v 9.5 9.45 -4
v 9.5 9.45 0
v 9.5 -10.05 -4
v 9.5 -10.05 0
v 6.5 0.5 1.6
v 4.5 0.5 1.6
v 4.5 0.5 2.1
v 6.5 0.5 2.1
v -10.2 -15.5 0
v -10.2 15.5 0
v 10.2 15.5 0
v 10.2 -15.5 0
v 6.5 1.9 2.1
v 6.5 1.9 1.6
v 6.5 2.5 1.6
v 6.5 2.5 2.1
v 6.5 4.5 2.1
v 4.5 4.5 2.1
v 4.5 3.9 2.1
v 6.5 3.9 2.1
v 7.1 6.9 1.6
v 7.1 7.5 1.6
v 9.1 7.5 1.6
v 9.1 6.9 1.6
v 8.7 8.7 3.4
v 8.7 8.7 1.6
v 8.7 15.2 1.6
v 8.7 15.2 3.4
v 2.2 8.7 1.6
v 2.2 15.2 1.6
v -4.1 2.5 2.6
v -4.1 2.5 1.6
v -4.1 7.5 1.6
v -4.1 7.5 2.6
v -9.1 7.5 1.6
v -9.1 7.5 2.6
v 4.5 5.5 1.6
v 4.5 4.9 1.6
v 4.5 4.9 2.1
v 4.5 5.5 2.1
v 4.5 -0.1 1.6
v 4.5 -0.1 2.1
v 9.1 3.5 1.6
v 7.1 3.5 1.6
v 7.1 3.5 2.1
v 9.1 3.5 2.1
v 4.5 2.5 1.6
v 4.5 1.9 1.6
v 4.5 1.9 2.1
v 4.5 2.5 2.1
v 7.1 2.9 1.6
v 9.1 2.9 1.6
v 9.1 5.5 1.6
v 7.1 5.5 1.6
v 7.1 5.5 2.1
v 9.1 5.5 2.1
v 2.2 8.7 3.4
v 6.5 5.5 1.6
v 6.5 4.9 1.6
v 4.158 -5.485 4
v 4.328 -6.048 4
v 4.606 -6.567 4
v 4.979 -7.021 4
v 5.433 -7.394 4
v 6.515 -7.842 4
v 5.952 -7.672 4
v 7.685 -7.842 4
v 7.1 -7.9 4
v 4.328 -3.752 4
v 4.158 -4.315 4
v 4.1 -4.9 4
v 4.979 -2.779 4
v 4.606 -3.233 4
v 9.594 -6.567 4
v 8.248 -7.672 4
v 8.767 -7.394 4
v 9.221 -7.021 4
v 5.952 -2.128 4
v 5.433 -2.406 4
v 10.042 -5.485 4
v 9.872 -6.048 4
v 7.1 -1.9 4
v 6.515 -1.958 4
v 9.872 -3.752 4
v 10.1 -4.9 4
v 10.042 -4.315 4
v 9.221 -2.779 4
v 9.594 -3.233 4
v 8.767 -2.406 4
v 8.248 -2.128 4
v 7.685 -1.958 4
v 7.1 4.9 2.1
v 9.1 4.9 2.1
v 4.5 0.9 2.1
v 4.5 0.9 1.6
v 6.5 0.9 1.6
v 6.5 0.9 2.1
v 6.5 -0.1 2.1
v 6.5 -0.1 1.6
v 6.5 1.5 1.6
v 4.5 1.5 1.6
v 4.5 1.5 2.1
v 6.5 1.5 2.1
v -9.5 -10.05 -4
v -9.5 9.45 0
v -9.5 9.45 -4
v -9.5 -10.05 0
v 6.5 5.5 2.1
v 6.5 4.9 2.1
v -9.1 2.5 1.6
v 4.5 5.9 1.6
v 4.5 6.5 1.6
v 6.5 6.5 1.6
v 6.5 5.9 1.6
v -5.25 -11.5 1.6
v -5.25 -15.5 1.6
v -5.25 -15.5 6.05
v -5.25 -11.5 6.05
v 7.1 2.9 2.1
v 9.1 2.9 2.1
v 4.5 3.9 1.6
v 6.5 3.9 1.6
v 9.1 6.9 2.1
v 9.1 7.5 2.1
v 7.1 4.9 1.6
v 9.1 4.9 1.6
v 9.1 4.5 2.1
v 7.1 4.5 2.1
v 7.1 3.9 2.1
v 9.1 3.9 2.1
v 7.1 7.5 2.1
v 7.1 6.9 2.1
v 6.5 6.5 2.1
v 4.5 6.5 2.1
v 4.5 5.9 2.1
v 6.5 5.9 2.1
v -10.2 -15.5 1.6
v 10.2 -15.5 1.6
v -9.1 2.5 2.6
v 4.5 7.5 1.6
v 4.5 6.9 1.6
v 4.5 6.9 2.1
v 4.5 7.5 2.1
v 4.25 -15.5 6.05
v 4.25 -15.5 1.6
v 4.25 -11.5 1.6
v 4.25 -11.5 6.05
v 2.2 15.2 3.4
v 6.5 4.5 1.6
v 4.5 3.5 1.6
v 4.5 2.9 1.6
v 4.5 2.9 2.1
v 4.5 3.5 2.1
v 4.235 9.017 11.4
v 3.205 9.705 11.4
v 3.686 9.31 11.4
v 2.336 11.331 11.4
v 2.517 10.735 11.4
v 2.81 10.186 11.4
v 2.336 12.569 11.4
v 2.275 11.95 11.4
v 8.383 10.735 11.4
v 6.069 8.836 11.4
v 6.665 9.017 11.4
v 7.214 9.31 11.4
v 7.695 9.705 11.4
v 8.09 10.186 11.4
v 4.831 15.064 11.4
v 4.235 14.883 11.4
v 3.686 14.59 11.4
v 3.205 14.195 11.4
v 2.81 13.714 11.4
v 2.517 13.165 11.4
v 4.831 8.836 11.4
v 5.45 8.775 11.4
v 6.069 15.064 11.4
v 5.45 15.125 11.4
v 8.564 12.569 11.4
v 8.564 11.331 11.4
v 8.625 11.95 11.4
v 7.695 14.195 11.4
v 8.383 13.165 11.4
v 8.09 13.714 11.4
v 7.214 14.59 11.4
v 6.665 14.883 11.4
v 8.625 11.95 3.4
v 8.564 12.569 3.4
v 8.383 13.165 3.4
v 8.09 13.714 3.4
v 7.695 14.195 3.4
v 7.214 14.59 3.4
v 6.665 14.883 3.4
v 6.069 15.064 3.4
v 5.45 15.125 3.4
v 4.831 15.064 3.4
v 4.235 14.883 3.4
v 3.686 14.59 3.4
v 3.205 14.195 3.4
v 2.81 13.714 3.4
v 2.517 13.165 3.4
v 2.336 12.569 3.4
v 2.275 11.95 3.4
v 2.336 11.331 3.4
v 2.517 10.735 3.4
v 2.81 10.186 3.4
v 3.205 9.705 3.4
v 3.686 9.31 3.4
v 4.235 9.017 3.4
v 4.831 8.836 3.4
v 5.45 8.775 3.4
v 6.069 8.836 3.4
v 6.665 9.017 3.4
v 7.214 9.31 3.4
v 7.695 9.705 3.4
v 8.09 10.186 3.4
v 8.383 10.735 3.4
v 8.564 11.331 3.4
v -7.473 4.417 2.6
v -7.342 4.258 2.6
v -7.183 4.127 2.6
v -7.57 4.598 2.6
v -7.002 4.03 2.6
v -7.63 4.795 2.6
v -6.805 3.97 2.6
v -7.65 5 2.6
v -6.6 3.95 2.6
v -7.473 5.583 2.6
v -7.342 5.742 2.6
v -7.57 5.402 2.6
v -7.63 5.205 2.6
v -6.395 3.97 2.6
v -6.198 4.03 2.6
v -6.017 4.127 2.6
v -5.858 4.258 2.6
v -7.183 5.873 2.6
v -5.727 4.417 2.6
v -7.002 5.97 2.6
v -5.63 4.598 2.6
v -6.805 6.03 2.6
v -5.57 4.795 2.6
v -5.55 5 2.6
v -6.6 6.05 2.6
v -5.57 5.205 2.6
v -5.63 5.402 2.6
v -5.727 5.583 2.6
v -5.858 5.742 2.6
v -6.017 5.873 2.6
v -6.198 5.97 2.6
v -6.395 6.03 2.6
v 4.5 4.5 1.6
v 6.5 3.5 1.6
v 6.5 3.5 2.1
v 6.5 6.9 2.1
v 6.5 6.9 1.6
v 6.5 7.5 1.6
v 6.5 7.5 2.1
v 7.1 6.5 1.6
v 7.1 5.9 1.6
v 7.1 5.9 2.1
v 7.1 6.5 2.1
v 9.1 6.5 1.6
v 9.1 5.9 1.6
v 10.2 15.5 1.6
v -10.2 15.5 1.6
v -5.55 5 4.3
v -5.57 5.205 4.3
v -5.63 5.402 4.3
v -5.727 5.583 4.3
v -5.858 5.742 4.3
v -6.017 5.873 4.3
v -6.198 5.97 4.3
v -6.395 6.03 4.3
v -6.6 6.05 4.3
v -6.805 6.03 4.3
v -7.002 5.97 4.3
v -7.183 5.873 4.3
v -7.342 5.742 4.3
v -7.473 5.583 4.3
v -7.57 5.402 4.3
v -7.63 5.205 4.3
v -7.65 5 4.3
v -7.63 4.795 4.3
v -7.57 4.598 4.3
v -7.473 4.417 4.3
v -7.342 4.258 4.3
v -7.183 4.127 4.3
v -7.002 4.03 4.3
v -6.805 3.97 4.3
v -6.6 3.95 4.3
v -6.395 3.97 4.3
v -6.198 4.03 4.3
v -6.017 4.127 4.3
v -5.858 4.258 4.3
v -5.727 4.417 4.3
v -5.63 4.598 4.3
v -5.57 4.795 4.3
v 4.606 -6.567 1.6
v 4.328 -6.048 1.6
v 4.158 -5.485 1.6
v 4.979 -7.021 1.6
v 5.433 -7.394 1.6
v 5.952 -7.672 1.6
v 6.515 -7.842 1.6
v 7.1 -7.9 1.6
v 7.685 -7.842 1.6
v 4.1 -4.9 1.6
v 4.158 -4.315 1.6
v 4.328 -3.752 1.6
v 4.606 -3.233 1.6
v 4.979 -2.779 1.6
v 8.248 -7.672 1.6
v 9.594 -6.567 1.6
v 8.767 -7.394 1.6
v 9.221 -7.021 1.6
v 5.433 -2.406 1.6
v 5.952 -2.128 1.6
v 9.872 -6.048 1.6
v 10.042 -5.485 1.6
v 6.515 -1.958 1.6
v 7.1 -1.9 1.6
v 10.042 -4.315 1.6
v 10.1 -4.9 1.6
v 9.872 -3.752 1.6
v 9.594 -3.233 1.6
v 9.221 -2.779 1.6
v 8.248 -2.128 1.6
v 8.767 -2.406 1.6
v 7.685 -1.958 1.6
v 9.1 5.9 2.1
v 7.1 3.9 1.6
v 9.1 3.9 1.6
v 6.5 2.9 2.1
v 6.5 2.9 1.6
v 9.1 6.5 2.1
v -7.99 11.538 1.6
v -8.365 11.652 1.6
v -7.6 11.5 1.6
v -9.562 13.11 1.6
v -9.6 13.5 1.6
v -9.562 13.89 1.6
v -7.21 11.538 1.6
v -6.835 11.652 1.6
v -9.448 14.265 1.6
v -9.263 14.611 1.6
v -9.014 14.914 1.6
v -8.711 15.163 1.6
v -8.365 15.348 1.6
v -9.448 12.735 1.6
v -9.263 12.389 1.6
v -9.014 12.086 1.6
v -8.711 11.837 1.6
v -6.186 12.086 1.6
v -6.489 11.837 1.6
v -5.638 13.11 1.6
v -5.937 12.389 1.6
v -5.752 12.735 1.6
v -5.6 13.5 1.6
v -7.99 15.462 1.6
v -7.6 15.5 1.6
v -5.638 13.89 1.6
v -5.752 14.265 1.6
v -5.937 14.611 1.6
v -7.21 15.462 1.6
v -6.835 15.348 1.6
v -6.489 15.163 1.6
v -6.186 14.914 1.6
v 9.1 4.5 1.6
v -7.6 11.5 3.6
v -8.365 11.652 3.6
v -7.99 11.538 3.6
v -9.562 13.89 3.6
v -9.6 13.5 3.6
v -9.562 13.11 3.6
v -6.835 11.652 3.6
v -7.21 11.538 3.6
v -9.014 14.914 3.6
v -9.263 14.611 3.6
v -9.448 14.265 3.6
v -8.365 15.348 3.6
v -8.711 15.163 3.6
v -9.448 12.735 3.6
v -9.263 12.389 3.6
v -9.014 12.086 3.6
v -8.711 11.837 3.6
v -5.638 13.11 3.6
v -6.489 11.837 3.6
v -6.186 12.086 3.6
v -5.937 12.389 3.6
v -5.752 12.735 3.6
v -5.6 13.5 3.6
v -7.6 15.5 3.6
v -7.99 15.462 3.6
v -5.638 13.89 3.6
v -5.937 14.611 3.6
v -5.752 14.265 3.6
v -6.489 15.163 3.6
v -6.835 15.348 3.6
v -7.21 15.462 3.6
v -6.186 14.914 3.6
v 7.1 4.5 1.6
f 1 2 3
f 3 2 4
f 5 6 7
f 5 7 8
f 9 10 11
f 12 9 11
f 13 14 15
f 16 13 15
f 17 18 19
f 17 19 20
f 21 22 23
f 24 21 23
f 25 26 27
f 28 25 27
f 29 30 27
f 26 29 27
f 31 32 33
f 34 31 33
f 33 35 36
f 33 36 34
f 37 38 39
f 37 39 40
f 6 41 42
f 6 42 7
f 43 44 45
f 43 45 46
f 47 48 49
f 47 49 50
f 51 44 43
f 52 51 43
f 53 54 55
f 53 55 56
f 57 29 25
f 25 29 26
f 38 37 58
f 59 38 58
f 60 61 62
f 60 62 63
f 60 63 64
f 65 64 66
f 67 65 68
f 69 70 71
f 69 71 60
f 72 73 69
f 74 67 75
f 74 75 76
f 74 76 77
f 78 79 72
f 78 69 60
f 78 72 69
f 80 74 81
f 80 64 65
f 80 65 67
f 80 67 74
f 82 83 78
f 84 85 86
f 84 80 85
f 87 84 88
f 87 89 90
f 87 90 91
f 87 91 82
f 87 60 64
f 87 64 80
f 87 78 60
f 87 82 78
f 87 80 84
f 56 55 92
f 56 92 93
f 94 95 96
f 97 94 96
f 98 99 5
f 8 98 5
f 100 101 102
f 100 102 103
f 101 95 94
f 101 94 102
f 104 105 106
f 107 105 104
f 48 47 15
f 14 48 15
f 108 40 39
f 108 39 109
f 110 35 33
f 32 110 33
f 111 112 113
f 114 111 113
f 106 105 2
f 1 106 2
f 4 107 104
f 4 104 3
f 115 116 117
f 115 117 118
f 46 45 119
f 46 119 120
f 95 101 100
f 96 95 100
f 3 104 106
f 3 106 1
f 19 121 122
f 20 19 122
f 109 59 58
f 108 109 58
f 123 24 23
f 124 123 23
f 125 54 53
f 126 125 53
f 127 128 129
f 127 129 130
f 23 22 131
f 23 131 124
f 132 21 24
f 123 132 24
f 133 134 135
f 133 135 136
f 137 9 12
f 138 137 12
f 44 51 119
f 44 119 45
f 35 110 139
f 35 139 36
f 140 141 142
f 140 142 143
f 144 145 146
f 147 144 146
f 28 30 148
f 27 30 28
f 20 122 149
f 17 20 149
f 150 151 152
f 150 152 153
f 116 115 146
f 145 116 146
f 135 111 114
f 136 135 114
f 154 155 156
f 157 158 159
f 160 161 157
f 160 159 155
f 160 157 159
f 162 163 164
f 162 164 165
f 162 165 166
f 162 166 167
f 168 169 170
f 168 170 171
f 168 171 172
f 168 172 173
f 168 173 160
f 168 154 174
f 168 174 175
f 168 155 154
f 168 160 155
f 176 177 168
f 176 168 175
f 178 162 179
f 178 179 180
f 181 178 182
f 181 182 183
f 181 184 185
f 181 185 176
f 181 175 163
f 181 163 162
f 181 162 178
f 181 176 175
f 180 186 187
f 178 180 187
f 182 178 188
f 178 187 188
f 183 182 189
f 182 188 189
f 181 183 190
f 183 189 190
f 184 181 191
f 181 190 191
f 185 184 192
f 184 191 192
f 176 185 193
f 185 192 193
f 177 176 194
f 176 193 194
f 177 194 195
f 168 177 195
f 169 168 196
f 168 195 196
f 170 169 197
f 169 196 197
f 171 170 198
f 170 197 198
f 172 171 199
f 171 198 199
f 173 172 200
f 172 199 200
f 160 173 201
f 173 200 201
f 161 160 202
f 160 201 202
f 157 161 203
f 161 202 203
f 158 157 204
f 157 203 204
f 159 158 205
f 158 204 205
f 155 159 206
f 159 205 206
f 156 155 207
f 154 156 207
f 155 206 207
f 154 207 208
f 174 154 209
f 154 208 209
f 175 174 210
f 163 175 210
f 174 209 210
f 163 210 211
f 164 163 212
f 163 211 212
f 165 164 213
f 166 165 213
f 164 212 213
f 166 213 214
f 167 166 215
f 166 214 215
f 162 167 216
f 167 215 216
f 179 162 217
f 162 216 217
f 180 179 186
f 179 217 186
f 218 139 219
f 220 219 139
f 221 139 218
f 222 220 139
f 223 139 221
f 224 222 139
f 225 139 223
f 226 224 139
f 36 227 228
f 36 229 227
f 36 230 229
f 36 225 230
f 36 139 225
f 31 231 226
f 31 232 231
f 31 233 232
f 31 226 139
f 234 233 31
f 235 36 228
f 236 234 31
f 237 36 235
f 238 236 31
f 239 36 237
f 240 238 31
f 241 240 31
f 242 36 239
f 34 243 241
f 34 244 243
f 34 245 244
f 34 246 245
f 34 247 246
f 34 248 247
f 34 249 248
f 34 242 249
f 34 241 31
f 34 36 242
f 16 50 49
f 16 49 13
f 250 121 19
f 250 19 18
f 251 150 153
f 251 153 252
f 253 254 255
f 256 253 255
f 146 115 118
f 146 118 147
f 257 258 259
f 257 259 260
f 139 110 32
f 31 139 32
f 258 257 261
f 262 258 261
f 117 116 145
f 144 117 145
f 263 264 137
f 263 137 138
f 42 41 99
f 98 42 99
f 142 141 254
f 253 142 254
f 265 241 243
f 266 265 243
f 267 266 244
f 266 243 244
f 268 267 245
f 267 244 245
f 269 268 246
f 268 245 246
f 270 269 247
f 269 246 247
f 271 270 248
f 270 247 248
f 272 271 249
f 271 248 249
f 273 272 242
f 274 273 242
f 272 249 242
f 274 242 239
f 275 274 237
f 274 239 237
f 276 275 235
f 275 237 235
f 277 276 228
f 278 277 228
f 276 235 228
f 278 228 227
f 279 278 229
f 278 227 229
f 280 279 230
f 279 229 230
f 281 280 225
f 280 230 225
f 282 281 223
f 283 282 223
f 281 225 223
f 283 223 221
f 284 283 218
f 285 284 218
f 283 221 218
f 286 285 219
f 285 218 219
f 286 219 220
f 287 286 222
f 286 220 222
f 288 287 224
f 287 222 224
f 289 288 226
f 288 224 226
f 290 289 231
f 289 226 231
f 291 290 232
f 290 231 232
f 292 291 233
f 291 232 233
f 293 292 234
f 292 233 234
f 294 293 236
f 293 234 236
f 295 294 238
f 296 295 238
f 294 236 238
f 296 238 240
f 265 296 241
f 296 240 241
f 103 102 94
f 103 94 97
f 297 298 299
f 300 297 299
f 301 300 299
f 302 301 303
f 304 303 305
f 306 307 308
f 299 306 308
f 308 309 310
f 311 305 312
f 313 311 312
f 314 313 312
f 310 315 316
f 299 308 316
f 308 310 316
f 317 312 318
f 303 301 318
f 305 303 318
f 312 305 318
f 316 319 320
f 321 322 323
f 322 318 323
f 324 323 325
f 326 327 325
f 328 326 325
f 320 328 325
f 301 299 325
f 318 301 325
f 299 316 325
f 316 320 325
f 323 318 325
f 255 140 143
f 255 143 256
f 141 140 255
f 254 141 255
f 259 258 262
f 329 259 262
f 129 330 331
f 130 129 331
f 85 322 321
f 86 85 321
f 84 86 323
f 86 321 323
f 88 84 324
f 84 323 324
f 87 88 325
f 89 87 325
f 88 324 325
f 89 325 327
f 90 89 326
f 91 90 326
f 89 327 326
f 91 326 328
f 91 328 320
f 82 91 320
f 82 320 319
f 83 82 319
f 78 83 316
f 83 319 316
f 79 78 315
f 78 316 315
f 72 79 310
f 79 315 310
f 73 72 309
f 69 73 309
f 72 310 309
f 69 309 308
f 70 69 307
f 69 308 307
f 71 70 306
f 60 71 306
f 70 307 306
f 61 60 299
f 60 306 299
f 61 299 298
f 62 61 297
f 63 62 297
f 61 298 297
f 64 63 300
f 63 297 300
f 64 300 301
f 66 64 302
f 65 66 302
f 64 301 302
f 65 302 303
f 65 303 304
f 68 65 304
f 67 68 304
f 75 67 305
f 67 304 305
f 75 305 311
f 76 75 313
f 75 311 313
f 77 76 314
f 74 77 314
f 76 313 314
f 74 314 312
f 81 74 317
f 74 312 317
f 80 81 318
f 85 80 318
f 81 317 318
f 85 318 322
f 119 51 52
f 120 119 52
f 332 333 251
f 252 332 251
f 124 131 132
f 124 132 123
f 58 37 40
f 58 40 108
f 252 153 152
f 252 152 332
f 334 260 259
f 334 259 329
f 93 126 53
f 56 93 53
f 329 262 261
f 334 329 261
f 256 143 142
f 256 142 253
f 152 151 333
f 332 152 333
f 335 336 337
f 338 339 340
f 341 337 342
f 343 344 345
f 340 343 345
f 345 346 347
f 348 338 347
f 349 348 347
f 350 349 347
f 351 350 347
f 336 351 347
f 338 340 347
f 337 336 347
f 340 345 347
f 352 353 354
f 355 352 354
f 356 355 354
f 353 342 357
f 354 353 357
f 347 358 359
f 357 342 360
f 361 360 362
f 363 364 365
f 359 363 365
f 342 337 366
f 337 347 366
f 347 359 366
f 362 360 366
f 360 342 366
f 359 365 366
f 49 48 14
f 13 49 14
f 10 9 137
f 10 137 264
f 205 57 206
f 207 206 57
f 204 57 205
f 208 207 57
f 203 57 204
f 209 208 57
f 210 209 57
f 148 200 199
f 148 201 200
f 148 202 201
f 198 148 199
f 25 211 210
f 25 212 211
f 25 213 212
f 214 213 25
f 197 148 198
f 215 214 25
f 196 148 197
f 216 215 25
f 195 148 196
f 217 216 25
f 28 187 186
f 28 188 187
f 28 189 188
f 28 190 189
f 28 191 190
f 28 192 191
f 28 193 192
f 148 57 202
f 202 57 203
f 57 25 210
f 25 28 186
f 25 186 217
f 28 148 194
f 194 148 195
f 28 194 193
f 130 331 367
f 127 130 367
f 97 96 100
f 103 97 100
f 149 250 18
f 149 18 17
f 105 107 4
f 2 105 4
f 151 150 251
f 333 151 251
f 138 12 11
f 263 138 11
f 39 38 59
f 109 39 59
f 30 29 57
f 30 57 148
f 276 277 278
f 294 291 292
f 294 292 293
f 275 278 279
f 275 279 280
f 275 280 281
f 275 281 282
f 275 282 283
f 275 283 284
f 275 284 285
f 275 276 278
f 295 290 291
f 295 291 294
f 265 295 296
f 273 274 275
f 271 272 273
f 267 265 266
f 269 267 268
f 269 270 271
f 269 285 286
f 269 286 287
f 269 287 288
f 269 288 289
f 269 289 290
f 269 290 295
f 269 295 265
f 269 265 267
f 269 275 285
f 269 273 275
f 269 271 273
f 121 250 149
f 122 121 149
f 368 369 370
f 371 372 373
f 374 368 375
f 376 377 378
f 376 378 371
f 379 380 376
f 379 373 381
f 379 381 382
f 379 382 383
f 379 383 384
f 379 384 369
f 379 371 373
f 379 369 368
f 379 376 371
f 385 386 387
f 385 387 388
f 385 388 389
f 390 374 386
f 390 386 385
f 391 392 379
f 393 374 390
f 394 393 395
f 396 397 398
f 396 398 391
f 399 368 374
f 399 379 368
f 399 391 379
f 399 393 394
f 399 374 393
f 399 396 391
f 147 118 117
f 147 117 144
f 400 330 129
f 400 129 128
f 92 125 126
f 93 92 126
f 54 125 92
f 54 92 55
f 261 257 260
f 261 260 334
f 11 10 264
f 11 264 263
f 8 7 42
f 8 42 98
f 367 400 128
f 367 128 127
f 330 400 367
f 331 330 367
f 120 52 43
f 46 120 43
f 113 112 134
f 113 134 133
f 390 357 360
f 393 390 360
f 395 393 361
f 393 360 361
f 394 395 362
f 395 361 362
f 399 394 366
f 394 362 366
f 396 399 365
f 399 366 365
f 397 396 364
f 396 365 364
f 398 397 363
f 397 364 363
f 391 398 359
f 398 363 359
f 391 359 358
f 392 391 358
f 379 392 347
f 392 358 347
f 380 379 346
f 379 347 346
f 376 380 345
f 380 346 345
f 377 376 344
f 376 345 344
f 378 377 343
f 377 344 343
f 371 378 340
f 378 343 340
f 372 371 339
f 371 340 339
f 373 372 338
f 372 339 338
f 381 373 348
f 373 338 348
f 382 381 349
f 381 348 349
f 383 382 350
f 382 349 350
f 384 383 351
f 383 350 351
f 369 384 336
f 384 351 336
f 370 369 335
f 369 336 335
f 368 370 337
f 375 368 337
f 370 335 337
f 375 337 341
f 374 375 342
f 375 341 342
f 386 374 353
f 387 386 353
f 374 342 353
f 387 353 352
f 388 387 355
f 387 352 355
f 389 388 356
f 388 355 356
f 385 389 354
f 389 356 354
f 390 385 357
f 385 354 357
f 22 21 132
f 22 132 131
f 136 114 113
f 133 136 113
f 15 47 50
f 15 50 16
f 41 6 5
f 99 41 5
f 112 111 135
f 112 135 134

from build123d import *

# Parameters (mm, degrees)
F0_W      = 20.4
F0_H      = 31
F1_DEPTH  = 1.6
F2_W      = 6.5
F2_H      = 6.5
F3_DEPTH  = 1.8
F4_R      = 3.175
F5_DEPTH  = 8
F6_R      = 2
F7_DEPTH  = 2
F8_W      = 9.5
F8_H      = 4
F9_DEPTH  = 4.45
F10_W     = 5
F10_H     = 5
F11_DEPTH = 1
F12_R     = 1.05
F13_DEPTH = 1.7
F14_R     = 3
F15_DEPTH = 2.4
F16_W     = 19
F16_H     = 19.5
F17_DEPTH = 4
F18_W     = 2
F18_H     = 0.6
F19_DEPTH = 0.5


with BuildPart() as f1:
    # F0 (on Top) → F1 (new body)
    with BuildSketch(Plane.XY):
        Rectangle(F0_W, F0_H)
    extrude(amount=F1_DEPTH)


with BuildPart() as f3:
    # F2 (on face) → F3 (new body)
    with BuildSketch(Plane.XY.offset(1.6)):
        with Locations((5.45, 11.95)):
            Rectangle(F2_W, F2_H)
    extrude(amount=F3_DEPTH)

    # F4 (on face) → F5 (join)
    with BuildSketch(Plane.XY.offset(3.4)):
        with Locations((5.45, 11.95)):
            Circle(F4_R)
    extrude(amount=F5_DEPTH)


with BuildPart() as f7:
    # F6 (on face) → F7 (new body)
    with BuildSketch(Plane.XY.offset(1.6)):
        with Locations((-7.6, 13.5)):
            Circle(F6_R)
    extrude(amount=F7_DEPTH)


with BuildPart() as f9:
    # F8 (on face) → F9 (new body)
    with BuildSketch(Plane.XY.offset(1.6)):
        with Locations((-0.5, -13.5)):
            Rectangle(F8_W, F8_H)
    extrude(amount=F9_DEPTH)


with BuildPart() as f11:
    # F10 (on face) → F11 (new body)
    with BuildSketch(Plane.XY.offset(1.6)):
        with Locations((-6.6, 5)):
            Rectangle(F10_W, F10_H)
    extrude(amount=F11_DEPTH)

    # F12 (on face) → F13 (join)
    with BuildSketch(Plane.XY.offset(2.6)):
        with Locations((-6.6, 5)):
            Circle(F12_R)
    extrude(amount=F13_DEPTH)


with BuildPart() as f15:
    # F14 (on face) → F15 (new body)
    with BuildSketch(Plane.XY.offset(1.6)):
        with Locations((7.1, -4.9)):
            Circle(F14_R)
    extrude(amount=F15_DEPTH)


with BuildPart() as f17:
    # F16 (on face) → F17 (new body)
    with BuildSketch(Plane(origin=(0, 0, 0), x_dir=(1, 0, 0), z_dir=(0, 0, -1))):
        with Locations((0, 0.3)):
            Rectangle(F16_W, F16_H)
    extrude(amount=F17_DEPTH)


with BuildPart() as f19:
    # F18 (on face) → F19 (new body)
    with BuildSketch(Plane.XY.offset(1.6)):
        with Locations((8.1, 7.2)):
            Rectangle(F18_W, F18_H)
        with Locations((8.1, 6.2)):
            Rectangle(F18_W, F18_H)
        with Locations((8.1, 5.2)):
            Rectangle(F18_W, F18_H)
        with Locations((8.1, 4.2)):
            Rectangle(F18_W, F18_H)
        with Locations((8.1, 3.2)):
            Rectangle(F18_W, F18_H)
        with Locations((5.5, 7.2)):
            Rectangle(F18_W, F18_H)
        with Locations((5.5, 6.2)):
            Rectangle(F18_W, F18_H)
        with Locations((5.5, 5.2)):
            Rectangle(F18_W, F18_H)
        with Locations((5.5, 4.2)):
            Rectangle(F18_W, F18_H)
        with Locations((5.5, 3.2)):
            Rectangle(F18_W, F18_H)
        with Locations((5.5, 2.2)):
            Rectangle(F18_W, F18_H)
        with Locations((5.5, 1.2)):
            Rectangle(F18_W, F18_H)
        with Locations((5.5, 0.2)):
            Rectangle(F18_W, F18_H)
    extrude(amount=F19_DEPTH)


solid = Compound([f1.part, f3.part, f7.part, f9.part, f11.part, f15.part, f17.part, f19.part])
